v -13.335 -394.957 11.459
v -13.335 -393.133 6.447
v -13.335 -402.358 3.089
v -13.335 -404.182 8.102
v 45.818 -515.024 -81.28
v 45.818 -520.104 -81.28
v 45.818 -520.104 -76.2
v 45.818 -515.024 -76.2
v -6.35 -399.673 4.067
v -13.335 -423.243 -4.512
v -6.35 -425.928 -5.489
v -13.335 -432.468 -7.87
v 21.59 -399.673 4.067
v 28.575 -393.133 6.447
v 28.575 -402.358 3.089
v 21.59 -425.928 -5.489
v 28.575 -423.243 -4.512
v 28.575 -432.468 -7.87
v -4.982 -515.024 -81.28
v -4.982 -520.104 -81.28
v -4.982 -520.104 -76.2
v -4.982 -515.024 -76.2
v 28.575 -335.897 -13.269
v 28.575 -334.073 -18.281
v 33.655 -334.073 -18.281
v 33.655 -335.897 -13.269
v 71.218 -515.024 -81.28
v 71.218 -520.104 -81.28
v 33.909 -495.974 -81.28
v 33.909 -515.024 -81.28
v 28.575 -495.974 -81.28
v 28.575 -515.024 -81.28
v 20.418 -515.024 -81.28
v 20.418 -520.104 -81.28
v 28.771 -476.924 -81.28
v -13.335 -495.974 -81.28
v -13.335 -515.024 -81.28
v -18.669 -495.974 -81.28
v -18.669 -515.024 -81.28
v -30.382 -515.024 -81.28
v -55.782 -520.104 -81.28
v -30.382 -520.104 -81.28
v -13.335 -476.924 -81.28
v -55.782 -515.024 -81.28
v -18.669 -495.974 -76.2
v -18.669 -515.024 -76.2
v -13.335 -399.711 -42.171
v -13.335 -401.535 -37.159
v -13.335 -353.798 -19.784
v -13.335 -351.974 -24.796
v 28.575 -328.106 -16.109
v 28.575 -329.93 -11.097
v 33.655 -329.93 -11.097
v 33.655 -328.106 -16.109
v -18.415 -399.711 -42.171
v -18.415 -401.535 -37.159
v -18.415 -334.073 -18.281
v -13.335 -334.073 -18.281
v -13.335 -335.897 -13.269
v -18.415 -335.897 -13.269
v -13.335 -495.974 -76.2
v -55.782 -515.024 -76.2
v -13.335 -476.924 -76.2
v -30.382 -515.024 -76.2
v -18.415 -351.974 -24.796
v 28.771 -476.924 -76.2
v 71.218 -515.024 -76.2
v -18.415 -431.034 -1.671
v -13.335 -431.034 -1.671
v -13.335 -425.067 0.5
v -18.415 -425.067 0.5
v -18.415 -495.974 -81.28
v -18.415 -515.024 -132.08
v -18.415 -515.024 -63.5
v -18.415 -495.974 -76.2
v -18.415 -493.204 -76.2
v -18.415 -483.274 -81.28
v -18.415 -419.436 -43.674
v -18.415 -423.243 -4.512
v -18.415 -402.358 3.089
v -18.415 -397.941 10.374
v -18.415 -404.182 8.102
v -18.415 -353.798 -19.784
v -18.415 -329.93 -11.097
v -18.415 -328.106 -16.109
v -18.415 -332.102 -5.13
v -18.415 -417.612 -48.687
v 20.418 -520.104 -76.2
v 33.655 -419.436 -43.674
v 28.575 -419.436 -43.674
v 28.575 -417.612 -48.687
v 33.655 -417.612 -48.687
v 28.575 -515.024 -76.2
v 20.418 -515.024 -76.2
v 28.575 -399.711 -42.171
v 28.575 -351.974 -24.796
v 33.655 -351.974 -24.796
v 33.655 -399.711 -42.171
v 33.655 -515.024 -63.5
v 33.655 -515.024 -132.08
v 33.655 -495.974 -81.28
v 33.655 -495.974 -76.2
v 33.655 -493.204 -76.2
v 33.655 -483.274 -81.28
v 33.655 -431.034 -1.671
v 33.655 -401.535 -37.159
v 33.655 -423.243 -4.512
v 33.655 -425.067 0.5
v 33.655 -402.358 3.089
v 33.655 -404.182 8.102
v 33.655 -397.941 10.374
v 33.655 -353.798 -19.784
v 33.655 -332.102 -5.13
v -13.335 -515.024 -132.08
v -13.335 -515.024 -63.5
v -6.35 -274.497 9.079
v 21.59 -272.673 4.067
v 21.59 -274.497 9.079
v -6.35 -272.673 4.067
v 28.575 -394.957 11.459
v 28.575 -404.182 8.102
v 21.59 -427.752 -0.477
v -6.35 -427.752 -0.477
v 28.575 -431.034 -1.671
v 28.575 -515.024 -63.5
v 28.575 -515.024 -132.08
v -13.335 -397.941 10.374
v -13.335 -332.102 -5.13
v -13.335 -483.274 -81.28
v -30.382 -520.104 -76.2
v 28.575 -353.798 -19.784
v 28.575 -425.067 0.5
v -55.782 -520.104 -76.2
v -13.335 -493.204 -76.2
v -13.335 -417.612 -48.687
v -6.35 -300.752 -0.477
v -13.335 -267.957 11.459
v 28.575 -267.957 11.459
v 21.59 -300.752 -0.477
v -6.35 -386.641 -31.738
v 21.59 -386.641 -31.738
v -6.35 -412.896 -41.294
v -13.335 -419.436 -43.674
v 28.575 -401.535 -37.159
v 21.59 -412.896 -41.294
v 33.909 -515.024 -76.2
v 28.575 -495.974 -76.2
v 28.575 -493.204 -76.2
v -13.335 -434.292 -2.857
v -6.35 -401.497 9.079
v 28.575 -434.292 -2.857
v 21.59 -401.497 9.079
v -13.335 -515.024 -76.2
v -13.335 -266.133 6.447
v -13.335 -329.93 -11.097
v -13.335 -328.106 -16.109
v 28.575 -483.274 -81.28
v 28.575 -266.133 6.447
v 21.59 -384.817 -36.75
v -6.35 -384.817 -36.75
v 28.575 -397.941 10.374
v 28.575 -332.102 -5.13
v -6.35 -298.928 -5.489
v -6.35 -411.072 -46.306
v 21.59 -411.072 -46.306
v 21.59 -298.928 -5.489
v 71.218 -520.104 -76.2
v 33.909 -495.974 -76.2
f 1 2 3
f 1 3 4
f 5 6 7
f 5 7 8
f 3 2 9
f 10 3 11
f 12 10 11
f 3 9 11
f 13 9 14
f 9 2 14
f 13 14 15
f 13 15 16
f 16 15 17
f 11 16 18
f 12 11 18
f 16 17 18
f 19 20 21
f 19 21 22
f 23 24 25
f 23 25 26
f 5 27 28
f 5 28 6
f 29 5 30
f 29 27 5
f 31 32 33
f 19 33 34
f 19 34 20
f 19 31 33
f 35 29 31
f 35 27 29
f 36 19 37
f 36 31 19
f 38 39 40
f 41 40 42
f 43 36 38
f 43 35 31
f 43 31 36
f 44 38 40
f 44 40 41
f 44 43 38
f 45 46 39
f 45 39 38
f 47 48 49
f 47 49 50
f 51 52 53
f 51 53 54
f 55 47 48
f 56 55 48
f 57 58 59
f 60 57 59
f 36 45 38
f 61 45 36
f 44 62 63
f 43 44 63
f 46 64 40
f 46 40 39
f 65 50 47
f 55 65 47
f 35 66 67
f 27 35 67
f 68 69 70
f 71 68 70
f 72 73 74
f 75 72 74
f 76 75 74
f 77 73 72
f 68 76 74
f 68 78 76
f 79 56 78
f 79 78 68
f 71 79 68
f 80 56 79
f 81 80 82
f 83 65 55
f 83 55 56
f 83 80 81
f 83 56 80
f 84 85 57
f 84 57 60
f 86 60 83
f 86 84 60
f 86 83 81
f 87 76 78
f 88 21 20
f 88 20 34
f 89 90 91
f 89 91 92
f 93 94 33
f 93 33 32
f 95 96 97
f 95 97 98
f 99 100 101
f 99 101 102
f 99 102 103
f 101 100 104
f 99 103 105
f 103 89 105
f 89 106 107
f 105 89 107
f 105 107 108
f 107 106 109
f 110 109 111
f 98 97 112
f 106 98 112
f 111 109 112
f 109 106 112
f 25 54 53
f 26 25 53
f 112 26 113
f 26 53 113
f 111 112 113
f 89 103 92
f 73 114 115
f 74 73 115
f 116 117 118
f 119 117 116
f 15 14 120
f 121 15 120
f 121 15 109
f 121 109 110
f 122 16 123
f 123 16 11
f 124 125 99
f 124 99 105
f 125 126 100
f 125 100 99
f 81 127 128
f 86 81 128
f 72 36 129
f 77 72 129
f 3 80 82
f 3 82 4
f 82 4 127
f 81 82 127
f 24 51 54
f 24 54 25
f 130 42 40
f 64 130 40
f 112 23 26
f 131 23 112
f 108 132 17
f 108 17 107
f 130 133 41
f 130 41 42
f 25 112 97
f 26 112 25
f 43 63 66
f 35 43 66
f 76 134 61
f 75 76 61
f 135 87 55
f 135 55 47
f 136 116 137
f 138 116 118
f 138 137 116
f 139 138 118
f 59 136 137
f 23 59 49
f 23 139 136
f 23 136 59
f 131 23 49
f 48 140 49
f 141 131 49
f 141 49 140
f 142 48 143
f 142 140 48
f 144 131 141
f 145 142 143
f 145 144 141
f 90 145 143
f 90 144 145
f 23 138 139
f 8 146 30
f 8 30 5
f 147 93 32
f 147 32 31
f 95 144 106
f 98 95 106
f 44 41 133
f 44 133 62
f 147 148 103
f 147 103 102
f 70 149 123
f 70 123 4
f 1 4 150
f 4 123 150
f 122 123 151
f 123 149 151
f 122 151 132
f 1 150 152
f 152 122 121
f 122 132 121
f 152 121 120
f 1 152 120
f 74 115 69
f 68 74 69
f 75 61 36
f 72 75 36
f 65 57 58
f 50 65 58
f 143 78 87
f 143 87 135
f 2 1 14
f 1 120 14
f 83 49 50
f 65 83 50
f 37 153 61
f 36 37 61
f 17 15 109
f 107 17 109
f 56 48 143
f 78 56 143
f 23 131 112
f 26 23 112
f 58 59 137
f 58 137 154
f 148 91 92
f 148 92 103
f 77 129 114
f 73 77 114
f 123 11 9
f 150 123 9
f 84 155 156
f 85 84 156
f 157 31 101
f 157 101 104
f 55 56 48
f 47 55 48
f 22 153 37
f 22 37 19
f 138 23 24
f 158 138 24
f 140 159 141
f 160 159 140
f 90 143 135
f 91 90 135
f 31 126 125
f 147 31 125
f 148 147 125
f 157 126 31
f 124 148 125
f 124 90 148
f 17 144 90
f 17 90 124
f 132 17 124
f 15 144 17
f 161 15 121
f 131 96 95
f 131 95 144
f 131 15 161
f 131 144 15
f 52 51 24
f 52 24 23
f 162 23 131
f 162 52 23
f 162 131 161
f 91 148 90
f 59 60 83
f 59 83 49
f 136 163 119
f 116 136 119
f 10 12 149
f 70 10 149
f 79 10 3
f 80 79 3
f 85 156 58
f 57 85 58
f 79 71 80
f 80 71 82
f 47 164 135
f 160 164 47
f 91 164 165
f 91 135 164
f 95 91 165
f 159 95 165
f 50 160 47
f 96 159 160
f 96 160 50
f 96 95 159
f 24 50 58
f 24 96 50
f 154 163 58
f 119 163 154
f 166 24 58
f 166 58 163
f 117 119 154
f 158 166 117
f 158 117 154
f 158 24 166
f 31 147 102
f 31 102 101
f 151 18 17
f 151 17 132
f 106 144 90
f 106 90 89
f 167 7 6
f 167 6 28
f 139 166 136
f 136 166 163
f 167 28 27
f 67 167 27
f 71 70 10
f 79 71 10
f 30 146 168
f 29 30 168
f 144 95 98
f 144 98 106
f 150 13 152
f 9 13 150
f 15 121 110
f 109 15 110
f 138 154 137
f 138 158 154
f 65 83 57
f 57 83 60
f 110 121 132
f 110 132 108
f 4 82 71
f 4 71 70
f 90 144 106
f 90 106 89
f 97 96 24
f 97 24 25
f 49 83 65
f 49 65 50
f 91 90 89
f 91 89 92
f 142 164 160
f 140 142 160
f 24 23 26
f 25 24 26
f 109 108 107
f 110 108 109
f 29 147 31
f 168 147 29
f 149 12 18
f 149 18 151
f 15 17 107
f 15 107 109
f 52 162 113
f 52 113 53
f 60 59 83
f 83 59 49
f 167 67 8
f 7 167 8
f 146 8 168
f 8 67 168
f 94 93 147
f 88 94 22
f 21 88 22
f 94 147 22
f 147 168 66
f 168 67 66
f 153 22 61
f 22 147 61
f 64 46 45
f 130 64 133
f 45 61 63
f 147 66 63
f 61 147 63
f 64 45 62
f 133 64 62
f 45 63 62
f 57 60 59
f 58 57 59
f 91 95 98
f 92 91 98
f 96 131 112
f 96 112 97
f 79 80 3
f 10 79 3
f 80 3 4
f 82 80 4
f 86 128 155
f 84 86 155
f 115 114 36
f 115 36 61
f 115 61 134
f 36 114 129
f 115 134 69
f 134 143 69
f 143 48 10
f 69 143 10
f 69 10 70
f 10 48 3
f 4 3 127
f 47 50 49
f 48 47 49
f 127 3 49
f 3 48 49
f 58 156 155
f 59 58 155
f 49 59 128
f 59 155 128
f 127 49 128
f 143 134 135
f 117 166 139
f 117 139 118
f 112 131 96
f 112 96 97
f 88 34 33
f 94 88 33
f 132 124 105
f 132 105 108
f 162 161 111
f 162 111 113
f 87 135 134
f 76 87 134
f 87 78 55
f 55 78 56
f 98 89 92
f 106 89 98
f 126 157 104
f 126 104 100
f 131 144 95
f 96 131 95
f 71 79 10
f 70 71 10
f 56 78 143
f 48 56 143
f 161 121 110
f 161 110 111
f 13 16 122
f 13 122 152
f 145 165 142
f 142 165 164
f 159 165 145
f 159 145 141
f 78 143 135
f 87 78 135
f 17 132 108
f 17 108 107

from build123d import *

# Parameters (mm, degrees)
BOSS_EXTRUDE1_DEPTH        = 28.575
BOSS_EXTRUDE1_DEPTH_BACK   = 13.335
BOSS_EXTRUDE1_2_DEPTH      = 28.575
BOSS_EXTRUDE1_2_DEPTH_BACK = 13.335
SKETCH4_W                  = 27.94
SKETCH4_H                  = 27.94
CUT_EXTRUDE1_DEPTH         = 63.223845758
SKETCH6_W                  = 25.4
SKETCH6_H                  = 5.08
BOSS_EXTRUDE2_DEPTH        = 5.08
SKETCH7_W                  = 5.334
SKETCH7_H                  = 19.05
CUT_EXTRUDE2_DEPTH         = 6.08
SKETCH8_W                  = 5.08
SKETCH8_H                  = 22.225
BOSS_EXTRUDE3_DEPTH        = 5.334
SKETCH10_W                 = 5.08
SKETCH10_H                 = 19.05
BOSS_EXTRUDE4_DEPTH        = 5.334
BOSS_EXTRUDE5_DEPTH        = 5.08


with BuildPart() as part:
    # Sketch3 → Boss-Extrude1 (new body, two sides)
    with BuildSketch(Plane(origin=(0, 0, 0), x_dir=(0, 0, -1), z_dir=(1, 0, 0))) as boss_extrude1_sk:
        Polygon((-6.44711232, -266.133060512), (-11.459432759, -267.957395957), (43.67427004, -419.435999447), (48.686590479, -417.611664002), align=None)
    extrude(amount=BOSS_EXTRUDE1_DEPTH)
    extrude(boss_extrude1_sk.sketch, amount=-BOSS_EXTRUDE1_DEPTH_BACK)


with BuildPart() as body_2:
    # Sketch3 → Boss-Extrude1 2 (new body, two sides)
    with BuildSketch(Plane(origin=(0, 0, 0), x_dir=(0, 0, -1), z_dir=(1, 0, 0))) as boss_extrude1_2_sk:
        Polygon((7.869577264, -432.467841864), (2.857256824, -434.292177309), (-11.459432759, -394.957395957), (-6.44711232, -393.133060512), align=None)
    extrude(amount=BOSS_EXTRUDE1_2_DEPTH)
    extrude(boss_extrude1_2_sk.sketch, amount=-BOSS_EXTRUDE1_2_DEPTH_BACK)


with BuildPart() as cut_extrude1_tool:
    # Sketch4 → Cut-Extrude1 (new body, through all)
    with BuildSketch(Plane(origin=(0, -33.203716147, 91.226460356), x_dir=(-1, 0, 0), z_dir=(0, 0.342020143, -0.939692621))):
        with Locations((-7.62, -268.807830831)):
            Rectangle(SKETCH4_W, SKETCH4_H)
        with Locations((-7.62, -388.148793671)):
            Rectangle(SKETCH4_W, SKETCH4_H)
    extrude(amount=-CUT_EXTRUDE1_DEPTH)


with BuildPart() as part_1:
    add(part.part)

    # Cut-Extrude1: cut by cut_extrude1_tool
    add(cut_extrude1_tool.part, mode=Mode.SUBTRACT)

    # Sketch10 → Boss-Extrude4 (add)
    with BuildSketch(Plane(origin=(0, -35.028051592, 96.238780795), x_dir=(1, 0, 0), z_dir=(0, -0.342020143, 0.939692621))):
        with Locations((-15.875, -399.553393671)):
            Rectangle(SKETCH10_W, SKETCH10_H)
        with Locations((31.115, -399.553393671)):
            Rectangle(SKETCH10_W, SKETCH10_H)
        with Locations((-15.875, -329.703393671)):
            Rectangle(SKETCH10_W, SKETCH10_H)
        with Locations((31.115, -329.703393671)):
            Rectangle(SKETCH10_W, SKETCH10_H)
    extrude(amount=-BOSS_EXTRUDE4_DEPTH)


with BuildPart() as body_2_1:
    add(body_2.part)

    # Cut-Extrude1: cut by cut_extrude1_tool
    add(cut_extrude1_tool.part, mode=Mode.SUBTRACT)

    # Sketch8 → Boss-Extrude3 (add)
    with BuildSketch(Plane(origin=(0, -49.884229453, 137.05579401), x_dir=(1, 0, 0), z_dir=(0, -0.342020143, 0.939692621))):
        with Locations((-15.875, -388.148793671)):
            Rectangle(SKETCH8_W, SKETCH8_H)
        with Locations((31.115, -388.148793671)):
            Rectangle(SKETCH8_W, SKETCH8_H)
    extrude(amount=-BOSS_EXTRUDE3_DEPTH)


with BuildPart() as body_3:
    # Sketch6 → Boss-Extrude2 (new body)
    with BuildSketch(Plane.XY.offset(-76.2)):
        Polygon((28.771446995, -476.924428702), (71.218223498, -515.024428702), (45.818223498, -515.024428702), (20.418223498, -515.024428702), (-4.981776502, -515.024428702), (-30.381776502, -515.024428702), (-55.781776502, -515.024428702), (-13.335, -476.924428702), align=None)
        with Locations((58.518223498, -517.564428702)):
            Rectangle(SKETCH6_W, SKETCH6_H)
        with Locations((7.718223498, -517.564428702)):
            Rectangle(SKETCH6_W, SKETCH6_H)
        with Locations((-43.081776502, -517.564428702)):
            Rectangle(SKETCH6_W, SKETCH6_H)
    extrude(amount=-BOSS_EXTRUDE2_DEPTH)

    # Sketch7 → Cut-Extrude2 (cut, through all)
    with BuildSketch(Plane.XY.offset(-76.2)):
        with Locations((31.242, -505.499428702)):
            Rectangle(SKETCH7_W, SKETCH7_H)
        with Locations((-16.002, -505.499428702)):
            Rectangle(SKETCH7_W, SKETCH7_H)
    extrude(amount=-CUT_EXTRUDE2_DEPTH, mode=Mode.SUBTRACT)


with BuildPart() as body_4:
    # Sketch11 → Boss-Extrude5 (new body)
    with BuildSketch(Plane.ZY.offset(13.335)):
        Polygon((-5.129803246, -332.102105227), (-11.096851388, -329.930277317), (-13.268679298, -335.897325459), (-19.784163028, -353.798469885), (-24.796483468, -351.97413444), (-42.171106748, -399.710519576), (-37.158786309, -401.534855021), (-43.67427004, -419.435999447), (-48.686590479, -417.611664002), (-76.2, -493.204135394), (-76.2, -495.974428702), (-81.28, -495.974428702), (-81.28, -483.274428702), (-132.08, -515.024428702), (-63.5, -515.024428702), (-1.671438786, -431.034169023), (0.500389125, -425.067120881), (-4.511931315, -423.242785437), (3.089466371, -402.35811694), (8.10178681, -404.182452384), (10.373518804, -397.940920028), align=None)
        Polygon((-11.096851388, -329.930277317), (-16.109171827, -328.105941872), (-18.280999737, -334.072990014), (-13.268679298, -335.897325459), align=None)
    extrude(amount=BOSS_EXTRUDE5_DEPTH)


with BuildPart() as body_5:
    # Mirror1: mirrored copy
    add(body_4.part.mirror(Plane.ZY.offset(-7.62)))


solid = Compound([part_1.part, body_2_1.part, body_3.part, body_4.part, body_5.part])
